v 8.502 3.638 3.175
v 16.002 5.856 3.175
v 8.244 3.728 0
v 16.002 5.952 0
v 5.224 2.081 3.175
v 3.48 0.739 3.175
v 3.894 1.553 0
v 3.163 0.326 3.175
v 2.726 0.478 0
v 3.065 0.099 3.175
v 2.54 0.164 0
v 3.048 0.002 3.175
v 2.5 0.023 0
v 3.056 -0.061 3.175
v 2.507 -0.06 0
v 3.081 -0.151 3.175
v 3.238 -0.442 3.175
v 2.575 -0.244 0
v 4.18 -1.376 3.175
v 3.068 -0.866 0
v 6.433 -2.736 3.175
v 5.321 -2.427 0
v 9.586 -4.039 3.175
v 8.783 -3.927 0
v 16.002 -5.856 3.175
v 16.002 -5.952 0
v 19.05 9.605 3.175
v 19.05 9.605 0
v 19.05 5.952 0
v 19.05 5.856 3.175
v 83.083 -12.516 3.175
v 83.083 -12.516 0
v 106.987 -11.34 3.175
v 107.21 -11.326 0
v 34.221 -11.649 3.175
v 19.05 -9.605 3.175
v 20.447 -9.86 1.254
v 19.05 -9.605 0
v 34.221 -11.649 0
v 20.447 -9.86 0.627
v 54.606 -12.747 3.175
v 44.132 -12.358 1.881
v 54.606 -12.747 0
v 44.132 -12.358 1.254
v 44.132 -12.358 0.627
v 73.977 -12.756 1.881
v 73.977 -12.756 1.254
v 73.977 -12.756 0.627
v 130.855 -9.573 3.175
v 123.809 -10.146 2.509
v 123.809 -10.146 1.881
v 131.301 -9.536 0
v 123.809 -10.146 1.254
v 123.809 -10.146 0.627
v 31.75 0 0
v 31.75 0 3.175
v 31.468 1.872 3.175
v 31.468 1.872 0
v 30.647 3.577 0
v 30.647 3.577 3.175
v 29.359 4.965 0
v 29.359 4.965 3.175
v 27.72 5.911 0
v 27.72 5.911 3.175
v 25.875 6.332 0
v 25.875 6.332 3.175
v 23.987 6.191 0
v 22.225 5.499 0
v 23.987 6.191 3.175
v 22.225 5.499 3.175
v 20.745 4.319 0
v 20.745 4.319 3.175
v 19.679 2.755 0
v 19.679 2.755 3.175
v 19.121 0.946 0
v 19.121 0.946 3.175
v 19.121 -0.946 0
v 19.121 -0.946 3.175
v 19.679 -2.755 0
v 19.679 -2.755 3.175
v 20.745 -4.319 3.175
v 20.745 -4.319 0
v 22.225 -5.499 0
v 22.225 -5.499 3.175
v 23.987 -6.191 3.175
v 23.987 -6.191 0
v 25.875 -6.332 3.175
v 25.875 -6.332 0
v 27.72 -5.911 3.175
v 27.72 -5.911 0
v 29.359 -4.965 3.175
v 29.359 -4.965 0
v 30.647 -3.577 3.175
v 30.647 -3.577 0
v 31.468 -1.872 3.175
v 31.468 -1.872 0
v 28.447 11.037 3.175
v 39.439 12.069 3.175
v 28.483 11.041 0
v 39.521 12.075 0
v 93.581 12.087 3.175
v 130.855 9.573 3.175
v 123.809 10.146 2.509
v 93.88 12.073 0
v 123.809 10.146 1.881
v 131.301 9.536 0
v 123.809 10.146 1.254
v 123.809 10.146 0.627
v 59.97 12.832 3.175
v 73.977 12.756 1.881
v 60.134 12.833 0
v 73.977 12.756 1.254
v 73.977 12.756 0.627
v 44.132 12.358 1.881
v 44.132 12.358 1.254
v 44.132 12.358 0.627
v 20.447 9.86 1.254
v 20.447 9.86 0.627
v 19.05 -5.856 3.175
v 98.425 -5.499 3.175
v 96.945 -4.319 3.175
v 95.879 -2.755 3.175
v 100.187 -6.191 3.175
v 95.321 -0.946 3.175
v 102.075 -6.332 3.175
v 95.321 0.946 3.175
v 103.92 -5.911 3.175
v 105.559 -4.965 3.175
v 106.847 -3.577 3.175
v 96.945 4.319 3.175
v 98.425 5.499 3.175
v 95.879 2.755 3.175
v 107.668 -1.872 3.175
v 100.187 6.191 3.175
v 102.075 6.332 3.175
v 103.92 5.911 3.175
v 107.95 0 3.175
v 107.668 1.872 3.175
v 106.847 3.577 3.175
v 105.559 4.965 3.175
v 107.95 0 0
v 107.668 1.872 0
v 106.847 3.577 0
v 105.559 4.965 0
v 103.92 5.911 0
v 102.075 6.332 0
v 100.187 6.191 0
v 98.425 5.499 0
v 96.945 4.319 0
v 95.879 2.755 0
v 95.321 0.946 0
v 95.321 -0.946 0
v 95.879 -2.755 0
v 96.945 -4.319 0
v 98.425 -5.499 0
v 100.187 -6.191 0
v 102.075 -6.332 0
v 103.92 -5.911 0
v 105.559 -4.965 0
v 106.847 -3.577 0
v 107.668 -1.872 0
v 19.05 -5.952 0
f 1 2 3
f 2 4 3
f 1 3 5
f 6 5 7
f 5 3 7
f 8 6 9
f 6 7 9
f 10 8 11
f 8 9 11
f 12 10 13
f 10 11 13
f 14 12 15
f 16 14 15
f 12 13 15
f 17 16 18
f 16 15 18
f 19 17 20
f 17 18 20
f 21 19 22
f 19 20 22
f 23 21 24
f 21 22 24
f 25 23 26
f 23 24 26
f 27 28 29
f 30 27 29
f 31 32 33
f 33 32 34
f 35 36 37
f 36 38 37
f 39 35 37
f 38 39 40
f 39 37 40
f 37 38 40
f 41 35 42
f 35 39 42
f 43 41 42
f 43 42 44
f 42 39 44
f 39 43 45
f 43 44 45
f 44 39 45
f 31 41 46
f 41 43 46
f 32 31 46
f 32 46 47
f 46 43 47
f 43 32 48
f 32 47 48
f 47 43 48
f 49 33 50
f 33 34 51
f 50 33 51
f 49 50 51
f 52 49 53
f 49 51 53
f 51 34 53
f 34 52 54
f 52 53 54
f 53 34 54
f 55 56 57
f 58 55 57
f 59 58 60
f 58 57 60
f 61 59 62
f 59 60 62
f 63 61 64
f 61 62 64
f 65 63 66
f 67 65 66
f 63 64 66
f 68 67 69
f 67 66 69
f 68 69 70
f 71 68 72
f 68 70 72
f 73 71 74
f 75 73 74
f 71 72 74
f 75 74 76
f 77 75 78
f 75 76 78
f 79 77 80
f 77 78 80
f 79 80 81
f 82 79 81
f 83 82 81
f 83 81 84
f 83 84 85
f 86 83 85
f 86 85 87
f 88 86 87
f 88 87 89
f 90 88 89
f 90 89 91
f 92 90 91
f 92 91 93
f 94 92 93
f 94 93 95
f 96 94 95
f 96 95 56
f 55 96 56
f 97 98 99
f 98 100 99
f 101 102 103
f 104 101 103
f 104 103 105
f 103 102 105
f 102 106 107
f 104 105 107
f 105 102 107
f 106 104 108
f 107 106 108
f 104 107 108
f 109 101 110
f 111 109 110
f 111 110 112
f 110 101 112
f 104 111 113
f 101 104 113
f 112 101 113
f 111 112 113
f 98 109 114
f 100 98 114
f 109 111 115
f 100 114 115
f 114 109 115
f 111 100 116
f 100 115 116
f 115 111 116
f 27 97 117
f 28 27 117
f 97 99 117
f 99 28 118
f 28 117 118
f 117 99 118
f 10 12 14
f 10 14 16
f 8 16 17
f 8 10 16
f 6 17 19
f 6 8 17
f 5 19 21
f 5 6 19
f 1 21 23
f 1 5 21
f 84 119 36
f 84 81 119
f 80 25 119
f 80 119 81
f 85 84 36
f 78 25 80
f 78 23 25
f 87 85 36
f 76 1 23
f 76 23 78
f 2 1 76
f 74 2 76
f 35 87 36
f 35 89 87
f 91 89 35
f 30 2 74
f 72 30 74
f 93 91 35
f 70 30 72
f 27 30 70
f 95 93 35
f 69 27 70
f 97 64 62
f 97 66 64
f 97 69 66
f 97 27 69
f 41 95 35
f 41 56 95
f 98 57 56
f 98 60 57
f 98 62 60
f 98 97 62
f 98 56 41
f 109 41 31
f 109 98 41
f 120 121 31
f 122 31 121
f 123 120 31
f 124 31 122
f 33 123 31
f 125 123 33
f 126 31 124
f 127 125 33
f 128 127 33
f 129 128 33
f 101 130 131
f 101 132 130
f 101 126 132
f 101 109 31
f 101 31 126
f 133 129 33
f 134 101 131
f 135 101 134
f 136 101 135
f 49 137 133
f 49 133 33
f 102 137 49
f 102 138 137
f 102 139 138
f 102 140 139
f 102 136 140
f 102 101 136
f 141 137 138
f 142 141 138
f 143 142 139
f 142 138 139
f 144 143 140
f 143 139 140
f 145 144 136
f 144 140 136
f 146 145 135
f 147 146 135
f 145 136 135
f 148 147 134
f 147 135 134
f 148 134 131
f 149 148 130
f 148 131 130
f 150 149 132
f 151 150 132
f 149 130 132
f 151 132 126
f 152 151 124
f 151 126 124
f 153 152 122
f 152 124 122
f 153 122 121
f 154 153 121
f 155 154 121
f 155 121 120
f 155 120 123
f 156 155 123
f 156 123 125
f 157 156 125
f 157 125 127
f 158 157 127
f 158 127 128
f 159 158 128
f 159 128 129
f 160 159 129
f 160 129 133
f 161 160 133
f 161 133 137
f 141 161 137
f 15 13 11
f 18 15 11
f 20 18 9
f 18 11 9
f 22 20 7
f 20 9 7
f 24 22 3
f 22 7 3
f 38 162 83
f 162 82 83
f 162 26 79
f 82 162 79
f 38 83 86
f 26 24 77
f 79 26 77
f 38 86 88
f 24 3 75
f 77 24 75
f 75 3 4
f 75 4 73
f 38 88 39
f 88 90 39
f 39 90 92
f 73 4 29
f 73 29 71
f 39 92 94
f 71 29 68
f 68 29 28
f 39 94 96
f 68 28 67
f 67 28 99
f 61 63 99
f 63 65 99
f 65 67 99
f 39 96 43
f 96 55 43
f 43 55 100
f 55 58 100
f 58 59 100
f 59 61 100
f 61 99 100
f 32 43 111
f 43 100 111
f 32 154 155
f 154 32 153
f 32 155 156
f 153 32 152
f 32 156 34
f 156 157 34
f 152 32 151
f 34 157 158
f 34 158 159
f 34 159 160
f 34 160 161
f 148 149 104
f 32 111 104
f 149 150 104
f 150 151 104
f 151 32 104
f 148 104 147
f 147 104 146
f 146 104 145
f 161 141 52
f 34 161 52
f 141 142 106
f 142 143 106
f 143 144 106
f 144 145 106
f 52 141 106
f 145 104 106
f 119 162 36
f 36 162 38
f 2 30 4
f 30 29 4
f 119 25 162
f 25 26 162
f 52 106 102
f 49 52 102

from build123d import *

# Parameters (mm, degrees)
BOSS_EXTRUDE1_DEPTH     = 3.175
SKETCH2_R               = 6.35
CUT_EXTRUDE1_DEPTH      = 4.1750001
CUT_EXTRUDE2_DEPTH      = 13.851031146
CUT_EXTRUDE2_DEPTH_BACK = 13.851031146


with BuildPart() as part:
    # Sketch1 → Boss-Extrude1 (new body)
    with BuildSketch(Plane.XY):
        with BuildLine():
            add(Edge.make_bspline(
                [(214.122, 0.26979372), (214.042517561, 0.336401081), (213.528971009, 0.273510814), (212.614475706, 0.530942112), (210.937412976, 0.69005818), (208.678154781, 1.031540783), (205.767891794, 1.412612557), (202.258298365, 1.882266), (198.158505405, 2.4131646), (193.498201346, 3.004251359), (188.3046229, 3.645171414), (182.610259265, 4.327250831), (176.450111776, 5.042029836), (169.862114854, 5.779776892), (162.886908752, 6.531484704), (155.567547263, 7.287816965), (147.949138879, 8.039011284), (140.078674392, 8.774523149), (132.004623532, 9.484696808), (123.776853773, 10.157659428), (115.445921162, 10.782438327), (107.063264355, 11.347433986), (98.680532246, 11.840832833), (90.349330839, 12.250169768), (82.121113367, 12.564529441), (74.046372156, 12.77365626), (66.175007458, 12.867335678), (58.555385553, 12.838133258), (51.234483397, 12.680408315), (44.257364483, 12.390162696), (37.666974317, 11.966637162), (31.503817676, 11.411106073), (25.805608692, 10.727908153), (20.607079774, 9.922856403), (15.939732749, 9.004358901), (11.830923582, 7.982801344), (8.304000309, 6.868145192), (5.376882013, 5.670771919), (3.058903356, 4.398782317), (1.353631156, 3.049665872), (0.261418186, 1.590784391), (-0.121830169, 0), (0.261418186, -1.590784391), (1.353631156, -3.049665872), (3.058903356, -4.398782317), (5.376882013, -5.670771919), (8.304000309, -6.868145192), (11.830923582, -7.982801344), (15.939732749, -9.004358901), (20.607079774, -9.922856403), (25.805608692, -10.727908153), (31.503817676, -11.411106073), (37.666974317, -11.966637162), (44.257364483, -12.390162696), (51.234483397, -12.680408315), (58.555385553, -12.838133258), (66.175007458, -12.867335678), (74.046372156, -12.77365626), (82.121113367, -12.564529441), (90.349330839, -12.250169768), (98.680532246, -11.840832833), (107.063264355, -11.347433986), (115.445921162, -10.782438327), (123.776853773, -10.157659428), (132.004623532, -9.484696808), (140.078674392, -8.774523149), (147.949138879, -8.039011284), (155.567547263, -7.287816965), (162.886908752, -6.531484704), (169.862114854, -5.779776892), (176.450111776, -5.042029836), (182.610259265, -4.327250831), (188.3046229, -3.645171414), (193.498201346, -3.004251359), (198.158505405, -2.4131646), (202.258298365, -1.882266), (205.767891794, -1.412612557), (208.678154781, -1.031540783), (210.937412976, -0.69005818), (212.614475706, -0.530942112), (213.528971009, -0.273510814), (214.25071943, -0.361898032), (214.25071943, 0.161925093), (214.122, 0.26979372)],
                knots=[0, 0, 0, 0, 0.000762215, 0.003044706, 0.006832246, 0.012101176, 0.018817536, 0.026939455, 0.036414848, 0.047184629, 0.059180413, 0.072327874, 0.086544061, 0.10174058, 0.117823336, 0.134691452, 0.152240154, 0.17036129, 0.188941008, 0.207865435, 0.227016078, 0.246275696, 0.265524943, 0.284644966, 0.303520118, 0.322034575, 0.340078353, 0.357542593, 0.374325482, 0.390329891, 0.40546389, 0.419643801, 0.432793371, 0.444843817, 0.455737921, 0.465428653, 0.47388632, 0.481101634, 0.487101684, 0.491975368, 0.495930678, 0.499382808, 0.502834938, 0.506790248, 0.511663932, 0.517663982, 0.524879296, 0.533336963, 0.543027695, 0.553921799, 0.565972245, 0.579121815, 0.593301726, 0.608435725, 0.624440134, 0.641223023, 0.658687263, 0.676731041, 0.695245498, 0.71412065, 0.733240673, 0.75248992, 0.771749538, 0.790900181, 0.809824608, 0.828404326, 0.846525462, 0.864074164, 0.88094228, 0.897025036, 0.912221555, 0.926437743, 0.939585203, 0.951580988, 0.962350768, 0.971826161, 0.979948081, 0.98666444, 0.991933371, 0.99572091, 0.998003402, 0.998765616, 1, 1, 1, 1], degree=3))
        make_face()
    extrude(amount=BOSS_EXTRUDE1_DEPTH)

    # Sketch2 → Cut-Extrude1 (cut, through all)
    with BuildSketch(Plane.XY.offset(3.175)):
        with Locations((25.4, 0)):
            Circle(SKETCH2_R)
        with Locations((101.6, 0)):
            Circle(SKETCH2_R)
    extrude(amount=-CUT_EXTRUDE1_DEPTH, mode=Mode.SUBTRACT)

    # Sketch4 → Cut-Extrude2 (cut, two sides)
    with BuildSketch(Plane(origin=(0, 0, 0), x_dir=(1, 0, 0), z_dir=(0, 1, 0))) as cut_extrude2_sk:
        Polygon((131.301372669, 0), (130.854723983, -3.175), (214.218539573, -3.175), (214.218539573, 0), align=None)
    extrude(amount=CUT_EXTRUDE2_DEPTH, mode=Mode.SUBTRACT)
    extrude(cut_extrude2_sk.sketch, amount=-CUT_EXTRUDE2_DEPTH_BACK, mode=Mode.SUBTRACT)

    # Sketch6 → Cut-Loft1 section 0
    with BuildSketch(Plane.XY.offset(3.175)):
        with BuildLine():
            Line((19.05, -5.856388973), (19.05, -9.60451625))
            Line((19.05, -9.60451625), (19.05, -13.496705478))
            Line((19.05, -13.496705478), (-3.17679028, -18.7418168))
            Line((-3.17679028, -18.7418168), (-7.400210772, 8.670878009))
            Line((-7.400210772, 8.670878009), (19.05, 13.499844305))
            Line((19.05, 13.499844305), (19.05, 9.60451625))
            Line((19.05, 9.60451625), (19.05, 5.856388972))
            Line((19.05, 5.856388972), (16.002, 5.855689085))
            add(Edge.make_bspline(
                [(16.002, 5.855689085), (15.278985699, 5.689672728), (14.191834186, 5.424851558), (12.757843363, 5.037907465), (11.69367278, 4.729775055), (10.646700316, 4.403337894), (9.617692504, 4.055796047), (8.608301637, 3.684577658), (7.626216232, 3.28790719), (6.678573411, 2.8637313), (5.779182107, 2.40890834), (5.078910801, 2.000461241), (4.5709467, 1.665455737), (4.220151013, 1.411514439), (3.905914023, 1.157647081), (3.631157505, 0.904651906), (3.399885574, 0.653944439), (3.226743451, 0.433066972), (3.126676284, 0.2697322), (3.07552602, 0.144421915), (3.049218429, 0.037663177), (3.047390298, 5.5e-08), (3.04921854, -0.03766331), (3.075525744, -0.1444217), (3.126676947, -0.269732641), (3.226742145, -0.433066135), (3.399888053, -0.653946015), (3.631152817, -0.904648933), (3.905923107, -1.157652839), (4.220131475, -1.411502059), (4.570981553, -1.665477812), (5.078773369, -2.000374258), (5.77925724, -2.408956031), (6.678536824, -2.863707828), (7.626233895, -3.287919031), (8.608295197, -3.684572243), (9.617690306, -4.05579733), (10.64671253, -4.403340225), (11.693641898, -4.729767367), (12.757897505, -5.037921267), (14.191640812, -5.424801637), (15.278985699, -5.689672728), (16.002, -5.855689085)],
                knots=[0, 0, 0, 0, 0.0625, 0.09375, 0.125, 0.15625, 0.1875, 0.21875, 0.25, 0.28125, 0.3125, 0.34375, 0.359375, 0.375, 0.390625, 0.40625, 0.421875, 0.4375, 0.453125, 0.46875, 0.484375, 0.5, 0.515625, 0.53125, 0.546875, 0.5625, 0.578125, 0.59375, 0.609375, 0.625, 0.640625, 0.65625, 0.6875, 0.71875, 0.75, 0.78125, 0.8125, 0.84375, 0.875, 0.90625, 0.9375, 1, 1, 1, 1], degree=3))
            Line((16.002, -5.855689085), (19.05, -5.856388973))
        make_face()
    # Sketch5 → Cut-Loft1 section 1
    with BuildSketch(Plane(origin=(0, 0, 0), x_dir=(-1, 0, 0), z_dir=(0, 0, -1))):
        with BuildLine():
            Line((-19.05, -9.69489598), (-19.05, -5.952242124))
            Line((-19.05, -5.952242124), (-16.002, -5.952242124))
            add(Edge.make_bspline(
                [(-16.002, 5.952242124), (-15.254770655, 5.78657596), (-14.131320952, 5.521981031), (-12.64893123, 5.134599211), (-11.548436123, 4.825723352), (-10.465051878, 4.498073941), (-9.399590771, 4.148800211), (-8.353696965, 3.775270971), (-7.504851445, 3.442218555), (-6.842934482, 3.161623807), (-6.194794877, 2.871042337), (-5.414728041, 2.488039147), (-4.683877816, 2.074629942), (-4.151373193, 1.734752799), (-3.782164679, 1.476616997), (-3.449549124, 1.21792525), (-3.156545696, 0.959314296), (-2.90735717, 0.702084345), (-2.716911913, 0.473376027), (-2.620007494, 0.329250424), (-2.568278365, 0.232230216), (-2.539730887, 0.166366119), (-2.518563335, 0.105023254), (-2.505407276, 0.055343345), (-2.499698937, 0.022962059), (-2.498722808, 3.7e-08), (-2.499699014, -0.022962102), (-2.505407277, -0.055343359), (-2.518563346, -0.105023288), (-2.539730598, -0.166365891), (-2.568278462, -0.232230258), (-2.620012631, -0.329254292), (-2.716907842, -0.47337309), (-2.907361053, -0.702086989), (-3.156540251, -0.959310743), (-3.449558648, -1.217931354), (-3.782145051, -1.476604524), (-4.151407833, -1.734774759), (-4.683741695, -2.074543768), (-5.414804155, -2.48808676), (-6.194777113, -2.871030834), (-6.84292503, -3.16161805), (-7.50486635, -3.442227642), (-8.353689563, -3.77526546), (-9.399589141, -4.148801556), (-10.465063669, -4.498076208), (-11.54840573, -4.825715767), (-12.648984703, -5.134612855), (-14.131129756, -5.52193166), (-15.254770655, -5.78657596), (-16.002, -5.952242124)],
                knots=[0, 0, 0, 0, 0.0625, 0.09375, 0.125, 0.15625, 0.1875, 0.21875, 0.25, 0.265625, 0.28125, 0.3125, 0.34375, 0.359375, 0.375, 0.390625, 0.40625, 0.421875, 0.4375, 0.453125, 0.4609375, 0.46875, 0.4765625, 0.484375, 0.4921875, 0.5, 0.5078125, 0.515625, 0.5234375, 0.53125, 0.5390625, 0.546875, 0.5625, 0.578125, 0.59375, 0.609375, 0.625, 0.640625, 0.65625, 0.6875, 0.71875, 0.734375, 0.75, 0.78125, 0.8125, 0.84375, 0.875, 0.90625, 0.9375, 1, 1, 1, 1], degree=3))
            Line((-16.002, 5.952242124), (-19.05, 5.952242124))
            Line((-19.05, 5.952242124), (-19.05, 9.69489598))
            Line((-19.05, 9.69489598), (-19.05, 12.377646409))
            Line((-19.05, 12.377646409), (3.93721866, 8.635694366))
            Line((3.93721866, 8.635694366), (2.51171312, -11.744580154))
            Line((2.51171312, -11.744580154), (-19.05, -12.301418255))
            Line((-19.05, -12.301418255), (-19.05, -9.69489598))
        make_face()
    loft(mode=Mode.SUBTRACT)


solid = part.part
